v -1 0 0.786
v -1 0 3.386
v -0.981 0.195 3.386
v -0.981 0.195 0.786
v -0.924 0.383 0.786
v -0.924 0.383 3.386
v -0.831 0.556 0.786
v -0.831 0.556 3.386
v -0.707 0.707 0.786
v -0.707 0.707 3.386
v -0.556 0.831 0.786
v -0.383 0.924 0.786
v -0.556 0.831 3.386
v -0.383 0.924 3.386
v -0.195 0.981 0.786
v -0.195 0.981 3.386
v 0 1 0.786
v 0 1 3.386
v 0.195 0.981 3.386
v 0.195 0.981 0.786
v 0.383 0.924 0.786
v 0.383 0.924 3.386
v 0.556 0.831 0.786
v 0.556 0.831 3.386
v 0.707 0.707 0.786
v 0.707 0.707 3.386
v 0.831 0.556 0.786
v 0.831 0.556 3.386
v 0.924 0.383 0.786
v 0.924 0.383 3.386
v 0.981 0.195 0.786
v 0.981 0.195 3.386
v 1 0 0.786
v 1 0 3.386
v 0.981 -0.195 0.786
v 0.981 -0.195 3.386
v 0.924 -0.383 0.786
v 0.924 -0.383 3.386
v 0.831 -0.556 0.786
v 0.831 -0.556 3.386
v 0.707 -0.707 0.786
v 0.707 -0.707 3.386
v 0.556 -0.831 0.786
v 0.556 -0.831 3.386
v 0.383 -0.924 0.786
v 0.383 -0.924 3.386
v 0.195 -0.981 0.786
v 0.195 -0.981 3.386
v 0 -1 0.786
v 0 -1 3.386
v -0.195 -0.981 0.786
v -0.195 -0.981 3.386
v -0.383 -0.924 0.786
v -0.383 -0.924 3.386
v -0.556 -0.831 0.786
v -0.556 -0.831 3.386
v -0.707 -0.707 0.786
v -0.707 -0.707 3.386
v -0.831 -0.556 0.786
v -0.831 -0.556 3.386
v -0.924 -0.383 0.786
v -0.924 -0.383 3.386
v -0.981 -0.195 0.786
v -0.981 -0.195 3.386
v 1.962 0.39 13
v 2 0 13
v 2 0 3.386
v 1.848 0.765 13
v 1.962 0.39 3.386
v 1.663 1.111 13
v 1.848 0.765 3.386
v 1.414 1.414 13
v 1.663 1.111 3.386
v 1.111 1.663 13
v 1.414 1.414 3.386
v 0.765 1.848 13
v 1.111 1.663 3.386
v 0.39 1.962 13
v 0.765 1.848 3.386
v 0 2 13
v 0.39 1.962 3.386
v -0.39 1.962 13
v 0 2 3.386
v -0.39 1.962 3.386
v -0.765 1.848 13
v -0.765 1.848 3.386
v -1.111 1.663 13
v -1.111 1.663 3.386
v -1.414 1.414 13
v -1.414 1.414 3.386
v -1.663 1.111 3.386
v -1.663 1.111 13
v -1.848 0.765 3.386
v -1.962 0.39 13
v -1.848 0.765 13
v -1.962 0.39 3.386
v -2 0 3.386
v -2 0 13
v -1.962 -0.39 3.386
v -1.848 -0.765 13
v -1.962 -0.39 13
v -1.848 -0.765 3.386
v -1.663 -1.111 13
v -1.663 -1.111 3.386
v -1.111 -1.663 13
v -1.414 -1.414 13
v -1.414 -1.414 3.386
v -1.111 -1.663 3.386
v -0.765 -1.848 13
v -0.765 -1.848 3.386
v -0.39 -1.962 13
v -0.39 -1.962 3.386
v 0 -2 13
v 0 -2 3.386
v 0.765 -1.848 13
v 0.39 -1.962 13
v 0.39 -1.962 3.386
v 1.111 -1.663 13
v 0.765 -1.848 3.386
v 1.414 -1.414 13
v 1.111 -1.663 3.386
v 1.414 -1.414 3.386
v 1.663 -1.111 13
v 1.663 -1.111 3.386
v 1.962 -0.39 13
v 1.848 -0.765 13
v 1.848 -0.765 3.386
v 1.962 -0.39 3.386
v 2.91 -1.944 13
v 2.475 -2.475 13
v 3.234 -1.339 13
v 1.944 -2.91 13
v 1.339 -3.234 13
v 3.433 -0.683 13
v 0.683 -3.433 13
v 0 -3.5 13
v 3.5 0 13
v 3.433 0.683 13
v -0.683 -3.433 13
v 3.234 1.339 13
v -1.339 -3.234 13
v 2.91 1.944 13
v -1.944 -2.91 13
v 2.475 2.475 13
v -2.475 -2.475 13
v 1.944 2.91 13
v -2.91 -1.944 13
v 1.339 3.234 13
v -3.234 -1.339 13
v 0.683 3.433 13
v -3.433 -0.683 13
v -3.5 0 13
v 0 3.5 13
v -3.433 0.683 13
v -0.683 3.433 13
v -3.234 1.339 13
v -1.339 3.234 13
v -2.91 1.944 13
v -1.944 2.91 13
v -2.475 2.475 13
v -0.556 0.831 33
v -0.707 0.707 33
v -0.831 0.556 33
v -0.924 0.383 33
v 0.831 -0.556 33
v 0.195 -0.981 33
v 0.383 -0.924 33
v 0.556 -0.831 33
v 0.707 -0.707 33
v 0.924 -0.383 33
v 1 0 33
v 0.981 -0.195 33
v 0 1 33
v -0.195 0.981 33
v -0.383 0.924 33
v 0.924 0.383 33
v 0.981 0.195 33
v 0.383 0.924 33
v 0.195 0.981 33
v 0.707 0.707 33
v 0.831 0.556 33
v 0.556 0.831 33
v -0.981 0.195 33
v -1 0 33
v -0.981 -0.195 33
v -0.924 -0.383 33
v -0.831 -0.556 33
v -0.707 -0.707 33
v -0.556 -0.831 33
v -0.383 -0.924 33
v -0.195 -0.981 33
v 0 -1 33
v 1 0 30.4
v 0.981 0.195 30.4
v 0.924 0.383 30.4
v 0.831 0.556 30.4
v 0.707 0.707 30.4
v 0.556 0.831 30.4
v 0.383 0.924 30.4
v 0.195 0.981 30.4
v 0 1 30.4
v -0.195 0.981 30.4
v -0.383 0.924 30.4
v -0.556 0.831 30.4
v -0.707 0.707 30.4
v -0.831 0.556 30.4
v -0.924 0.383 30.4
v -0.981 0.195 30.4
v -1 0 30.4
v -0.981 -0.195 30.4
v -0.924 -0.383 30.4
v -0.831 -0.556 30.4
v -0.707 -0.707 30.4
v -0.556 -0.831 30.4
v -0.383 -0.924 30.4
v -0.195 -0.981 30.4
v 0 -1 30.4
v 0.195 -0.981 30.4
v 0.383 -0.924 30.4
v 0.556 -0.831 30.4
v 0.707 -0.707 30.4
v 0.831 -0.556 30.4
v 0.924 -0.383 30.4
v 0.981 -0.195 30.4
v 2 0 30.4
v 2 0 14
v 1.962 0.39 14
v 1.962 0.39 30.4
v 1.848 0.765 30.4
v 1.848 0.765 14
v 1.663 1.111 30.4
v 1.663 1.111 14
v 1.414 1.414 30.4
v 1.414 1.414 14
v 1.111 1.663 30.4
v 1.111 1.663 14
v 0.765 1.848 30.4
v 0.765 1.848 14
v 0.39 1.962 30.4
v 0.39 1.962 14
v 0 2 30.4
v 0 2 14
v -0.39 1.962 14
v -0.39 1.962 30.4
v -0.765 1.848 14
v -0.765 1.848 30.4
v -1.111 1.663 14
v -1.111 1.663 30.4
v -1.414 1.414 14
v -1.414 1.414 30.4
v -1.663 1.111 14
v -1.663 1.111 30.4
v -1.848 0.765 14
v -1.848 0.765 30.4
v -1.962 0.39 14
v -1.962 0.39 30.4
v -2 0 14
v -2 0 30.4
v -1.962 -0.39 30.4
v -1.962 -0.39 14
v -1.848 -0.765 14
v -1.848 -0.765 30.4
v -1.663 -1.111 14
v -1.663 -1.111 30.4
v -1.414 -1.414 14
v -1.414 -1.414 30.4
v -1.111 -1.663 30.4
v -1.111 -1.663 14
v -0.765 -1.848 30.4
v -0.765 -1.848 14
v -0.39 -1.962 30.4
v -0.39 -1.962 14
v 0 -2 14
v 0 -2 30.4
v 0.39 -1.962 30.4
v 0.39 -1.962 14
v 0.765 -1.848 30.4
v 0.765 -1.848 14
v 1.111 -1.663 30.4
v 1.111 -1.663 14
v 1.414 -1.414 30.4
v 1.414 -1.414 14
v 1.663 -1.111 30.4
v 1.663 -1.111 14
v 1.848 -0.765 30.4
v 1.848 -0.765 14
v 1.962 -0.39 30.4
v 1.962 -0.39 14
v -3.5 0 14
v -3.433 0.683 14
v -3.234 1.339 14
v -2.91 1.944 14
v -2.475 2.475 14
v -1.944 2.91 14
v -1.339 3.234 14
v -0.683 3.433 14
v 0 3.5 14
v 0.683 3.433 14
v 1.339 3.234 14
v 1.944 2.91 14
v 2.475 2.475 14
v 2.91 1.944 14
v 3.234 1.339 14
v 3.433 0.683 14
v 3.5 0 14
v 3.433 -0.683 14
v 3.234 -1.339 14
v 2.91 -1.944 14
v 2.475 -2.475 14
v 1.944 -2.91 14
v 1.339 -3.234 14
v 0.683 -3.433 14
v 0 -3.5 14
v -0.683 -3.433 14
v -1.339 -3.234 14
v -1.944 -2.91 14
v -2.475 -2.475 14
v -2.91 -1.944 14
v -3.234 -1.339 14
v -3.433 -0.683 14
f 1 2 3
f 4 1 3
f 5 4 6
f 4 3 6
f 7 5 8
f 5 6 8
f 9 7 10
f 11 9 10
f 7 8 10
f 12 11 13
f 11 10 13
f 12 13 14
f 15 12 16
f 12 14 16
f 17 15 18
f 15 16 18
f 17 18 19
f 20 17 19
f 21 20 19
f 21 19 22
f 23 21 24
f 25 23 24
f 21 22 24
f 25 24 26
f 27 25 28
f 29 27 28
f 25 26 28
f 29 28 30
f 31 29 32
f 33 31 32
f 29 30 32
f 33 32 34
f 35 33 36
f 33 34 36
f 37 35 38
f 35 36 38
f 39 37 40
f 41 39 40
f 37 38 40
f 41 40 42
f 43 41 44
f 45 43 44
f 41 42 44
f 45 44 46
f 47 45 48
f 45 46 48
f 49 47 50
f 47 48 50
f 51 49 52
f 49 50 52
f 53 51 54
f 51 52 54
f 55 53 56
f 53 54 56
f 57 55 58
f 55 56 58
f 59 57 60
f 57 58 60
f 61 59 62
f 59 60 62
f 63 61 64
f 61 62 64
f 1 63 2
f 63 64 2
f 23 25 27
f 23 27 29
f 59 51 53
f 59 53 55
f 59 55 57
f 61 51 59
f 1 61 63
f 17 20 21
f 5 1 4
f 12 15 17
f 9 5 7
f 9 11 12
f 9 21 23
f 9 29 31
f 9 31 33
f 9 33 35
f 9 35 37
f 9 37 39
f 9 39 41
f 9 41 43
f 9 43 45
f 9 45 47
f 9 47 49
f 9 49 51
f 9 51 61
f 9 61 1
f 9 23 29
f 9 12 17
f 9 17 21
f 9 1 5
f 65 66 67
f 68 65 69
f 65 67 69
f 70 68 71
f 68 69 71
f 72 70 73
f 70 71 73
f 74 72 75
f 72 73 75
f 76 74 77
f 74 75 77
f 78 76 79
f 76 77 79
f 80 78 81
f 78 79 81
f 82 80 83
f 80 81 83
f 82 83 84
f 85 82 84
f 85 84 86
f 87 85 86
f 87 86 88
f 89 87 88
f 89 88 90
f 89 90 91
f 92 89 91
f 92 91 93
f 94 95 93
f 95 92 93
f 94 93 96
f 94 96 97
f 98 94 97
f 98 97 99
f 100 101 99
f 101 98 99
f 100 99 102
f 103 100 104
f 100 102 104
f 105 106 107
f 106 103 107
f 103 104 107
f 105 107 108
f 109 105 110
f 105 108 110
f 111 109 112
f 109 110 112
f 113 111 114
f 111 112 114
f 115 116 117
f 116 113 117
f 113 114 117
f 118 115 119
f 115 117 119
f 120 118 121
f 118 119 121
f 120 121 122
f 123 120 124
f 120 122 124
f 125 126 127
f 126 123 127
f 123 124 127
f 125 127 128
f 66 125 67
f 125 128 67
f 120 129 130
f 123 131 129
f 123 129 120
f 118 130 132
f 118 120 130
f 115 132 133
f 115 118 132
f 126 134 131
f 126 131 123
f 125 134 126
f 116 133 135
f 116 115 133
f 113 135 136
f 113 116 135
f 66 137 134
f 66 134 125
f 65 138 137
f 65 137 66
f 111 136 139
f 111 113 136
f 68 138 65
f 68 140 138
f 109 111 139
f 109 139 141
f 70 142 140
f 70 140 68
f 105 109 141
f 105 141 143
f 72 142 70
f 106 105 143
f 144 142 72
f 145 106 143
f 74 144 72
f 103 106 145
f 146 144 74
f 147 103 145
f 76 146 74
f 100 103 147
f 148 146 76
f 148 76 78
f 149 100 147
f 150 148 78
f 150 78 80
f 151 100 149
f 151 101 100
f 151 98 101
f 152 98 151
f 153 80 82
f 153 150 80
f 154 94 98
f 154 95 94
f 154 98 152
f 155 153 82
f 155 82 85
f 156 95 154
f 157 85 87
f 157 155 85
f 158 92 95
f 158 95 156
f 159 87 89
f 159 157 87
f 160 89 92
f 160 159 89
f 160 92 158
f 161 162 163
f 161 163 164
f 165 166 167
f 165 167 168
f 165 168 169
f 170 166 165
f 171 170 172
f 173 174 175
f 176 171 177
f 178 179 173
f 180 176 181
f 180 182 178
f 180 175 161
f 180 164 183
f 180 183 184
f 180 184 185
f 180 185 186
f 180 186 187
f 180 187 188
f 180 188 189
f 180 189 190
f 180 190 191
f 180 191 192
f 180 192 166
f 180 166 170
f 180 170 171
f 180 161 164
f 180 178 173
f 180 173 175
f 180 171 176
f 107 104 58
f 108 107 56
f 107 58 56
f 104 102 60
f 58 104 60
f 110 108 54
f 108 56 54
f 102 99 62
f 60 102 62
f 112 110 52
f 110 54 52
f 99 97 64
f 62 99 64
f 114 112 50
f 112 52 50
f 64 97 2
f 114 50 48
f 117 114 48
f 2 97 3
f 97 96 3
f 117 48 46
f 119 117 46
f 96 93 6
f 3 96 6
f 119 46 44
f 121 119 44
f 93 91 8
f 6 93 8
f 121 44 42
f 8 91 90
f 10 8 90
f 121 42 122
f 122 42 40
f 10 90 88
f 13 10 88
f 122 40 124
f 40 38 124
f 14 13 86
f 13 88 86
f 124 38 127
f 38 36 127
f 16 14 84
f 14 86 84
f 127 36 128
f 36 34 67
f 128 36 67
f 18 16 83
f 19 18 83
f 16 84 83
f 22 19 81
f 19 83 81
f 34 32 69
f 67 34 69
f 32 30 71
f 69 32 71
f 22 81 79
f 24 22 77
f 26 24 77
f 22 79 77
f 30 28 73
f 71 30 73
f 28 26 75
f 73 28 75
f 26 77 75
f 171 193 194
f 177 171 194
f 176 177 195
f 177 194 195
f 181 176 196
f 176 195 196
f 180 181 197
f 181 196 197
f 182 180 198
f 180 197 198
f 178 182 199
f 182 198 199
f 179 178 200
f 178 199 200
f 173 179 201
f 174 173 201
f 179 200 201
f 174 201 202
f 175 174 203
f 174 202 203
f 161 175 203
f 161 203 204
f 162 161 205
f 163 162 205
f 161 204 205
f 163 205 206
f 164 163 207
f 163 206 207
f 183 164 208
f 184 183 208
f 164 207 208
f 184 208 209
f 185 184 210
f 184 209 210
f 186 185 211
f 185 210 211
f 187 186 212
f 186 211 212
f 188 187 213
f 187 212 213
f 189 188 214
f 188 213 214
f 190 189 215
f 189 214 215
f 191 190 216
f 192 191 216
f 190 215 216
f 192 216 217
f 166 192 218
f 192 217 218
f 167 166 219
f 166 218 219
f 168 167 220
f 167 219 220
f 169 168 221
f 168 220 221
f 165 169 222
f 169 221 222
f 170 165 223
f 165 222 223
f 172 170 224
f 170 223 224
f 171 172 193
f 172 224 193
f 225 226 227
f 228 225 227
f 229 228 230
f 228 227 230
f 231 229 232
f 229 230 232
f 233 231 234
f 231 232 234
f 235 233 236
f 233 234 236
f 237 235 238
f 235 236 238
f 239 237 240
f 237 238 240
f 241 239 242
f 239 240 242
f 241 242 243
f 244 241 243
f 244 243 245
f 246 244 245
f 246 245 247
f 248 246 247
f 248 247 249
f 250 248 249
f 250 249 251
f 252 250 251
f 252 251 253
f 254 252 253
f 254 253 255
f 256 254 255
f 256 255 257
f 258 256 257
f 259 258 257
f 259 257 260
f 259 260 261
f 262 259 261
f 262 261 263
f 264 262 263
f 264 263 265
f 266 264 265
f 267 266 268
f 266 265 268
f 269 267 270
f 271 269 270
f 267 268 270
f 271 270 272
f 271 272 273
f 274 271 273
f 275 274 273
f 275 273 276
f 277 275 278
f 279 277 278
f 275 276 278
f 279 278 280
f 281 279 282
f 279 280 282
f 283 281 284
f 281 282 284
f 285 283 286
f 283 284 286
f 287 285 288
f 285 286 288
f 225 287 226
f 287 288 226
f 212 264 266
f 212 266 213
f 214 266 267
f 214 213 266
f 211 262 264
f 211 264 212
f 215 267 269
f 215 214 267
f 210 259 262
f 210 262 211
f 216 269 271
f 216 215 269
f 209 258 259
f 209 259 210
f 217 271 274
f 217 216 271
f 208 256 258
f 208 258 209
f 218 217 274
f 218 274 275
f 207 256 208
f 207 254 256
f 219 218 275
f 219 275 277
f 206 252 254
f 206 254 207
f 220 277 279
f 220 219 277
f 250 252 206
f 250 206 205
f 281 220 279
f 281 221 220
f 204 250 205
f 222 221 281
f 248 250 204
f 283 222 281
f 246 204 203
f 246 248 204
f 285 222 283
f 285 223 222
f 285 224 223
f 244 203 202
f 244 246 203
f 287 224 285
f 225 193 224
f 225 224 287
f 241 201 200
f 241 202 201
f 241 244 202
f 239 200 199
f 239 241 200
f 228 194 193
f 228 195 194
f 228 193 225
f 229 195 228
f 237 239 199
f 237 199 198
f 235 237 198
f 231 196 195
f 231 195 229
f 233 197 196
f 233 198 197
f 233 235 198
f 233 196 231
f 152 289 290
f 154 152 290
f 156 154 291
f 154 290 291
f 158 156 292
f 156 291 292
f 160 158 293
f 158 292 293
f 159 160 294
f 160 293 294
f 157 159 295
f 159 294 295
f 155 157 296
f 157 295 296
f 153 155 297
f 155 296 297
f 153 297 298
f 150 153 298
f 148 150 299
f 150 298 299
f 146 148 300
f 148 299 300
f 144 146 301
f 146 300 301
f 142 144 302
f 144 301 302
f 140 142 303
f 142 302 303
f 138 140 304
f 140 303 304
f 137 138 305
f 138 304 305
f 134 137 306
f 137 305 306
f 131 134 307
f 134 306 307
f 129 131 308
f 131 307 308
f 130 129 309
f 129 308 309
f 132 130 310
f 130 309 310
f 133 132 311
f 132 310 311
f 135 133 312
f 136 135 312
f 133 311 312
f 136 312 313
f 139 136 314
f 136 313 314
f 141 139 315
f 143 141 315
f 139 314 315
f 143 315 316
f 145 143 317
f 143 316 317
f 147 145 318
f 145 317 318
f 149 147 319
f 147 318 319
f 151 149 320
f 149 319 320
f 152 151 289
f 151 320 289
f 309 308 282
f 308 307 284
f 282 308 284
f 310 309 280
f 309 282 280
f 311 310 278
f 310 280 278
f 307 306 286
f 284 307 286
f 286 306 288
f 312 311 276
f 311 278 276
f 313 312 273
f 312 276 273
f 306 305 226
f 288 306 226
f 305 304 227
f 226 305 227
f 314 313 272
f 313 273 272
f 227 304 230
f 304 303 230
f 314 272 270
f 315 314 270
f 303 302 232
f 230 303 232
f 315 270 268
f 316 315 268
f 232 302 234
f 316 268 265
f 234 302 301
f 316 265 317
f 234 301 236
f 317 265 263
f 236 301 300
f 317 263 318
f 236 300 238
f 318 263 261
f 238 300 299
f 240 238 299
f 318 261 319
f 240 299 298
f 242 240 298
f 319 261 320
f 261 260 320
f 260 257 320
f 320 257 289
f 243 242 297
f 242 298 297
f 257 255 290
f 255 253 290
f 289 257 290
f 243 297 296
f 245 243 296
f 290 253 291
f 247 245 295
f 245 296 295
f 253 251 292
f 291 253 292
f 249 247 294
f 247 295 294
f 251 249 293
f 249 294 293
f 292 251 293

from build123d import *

# Parameters (mm, degrees)
EXTRUDE_START   = 3.386462
SKETCH_1_R      = 2
EXTRUDE_1_DEPTH = 27.013538
SKETCH_2_R      = 1
EXTRUDE_2_DEPTH = 2.6
SKETCH_4_R      = 1
EXTRUDE_3_DEPTH = 2.6
EXTRUDE_START_2 = -10.613538
SKETCH_6_R      = 3.5
EXTRUDE_5_DEPTH = 1


with BuildPart() as part:
    # Эскиз1 → Бобышка-Вытянуть1 (new body)
    with BuildSketch(Plane.XY.offset(EXTRUDE_START)):
        Circle(SKETCH_1_R)
    extrude(amount=EXTRUDE_1_DEPTH)

    # Эскиз2 → Бобышка-Вытянуть2 (add)
    with BuildSketch(Plane.XY.offset(30.4)):
        Circle(SKETCH_2_R)
    extrude(amount=EXTRUDE_2_DEPTH)

    # Эскиз4 → Бобышка-Вытянуть3 (add)
    with BuildSketch(Plane(origin=(0, 0, 3.386462289), x_dir=(-1, 0, 0), z_dir=(0, 0, -1))):
        Circle(SKETCH_4_R)
    extrude(amount=EXTRUDE_3_DEPTH)

    # Эскиз6 → Бобышка-Вытянуть5 (add)
    with BuildSketch(Plane(origin=(0, 0, 3.386462289), x_dir=(-1, 0, 0), z_dir=(0, 0, -1)).offset(EXTRUDE_START_2)):
        Circle(SKETCH_6_R)
    extrude(amount=EXTRUDE_5_DEPTH)


solid = part.part
